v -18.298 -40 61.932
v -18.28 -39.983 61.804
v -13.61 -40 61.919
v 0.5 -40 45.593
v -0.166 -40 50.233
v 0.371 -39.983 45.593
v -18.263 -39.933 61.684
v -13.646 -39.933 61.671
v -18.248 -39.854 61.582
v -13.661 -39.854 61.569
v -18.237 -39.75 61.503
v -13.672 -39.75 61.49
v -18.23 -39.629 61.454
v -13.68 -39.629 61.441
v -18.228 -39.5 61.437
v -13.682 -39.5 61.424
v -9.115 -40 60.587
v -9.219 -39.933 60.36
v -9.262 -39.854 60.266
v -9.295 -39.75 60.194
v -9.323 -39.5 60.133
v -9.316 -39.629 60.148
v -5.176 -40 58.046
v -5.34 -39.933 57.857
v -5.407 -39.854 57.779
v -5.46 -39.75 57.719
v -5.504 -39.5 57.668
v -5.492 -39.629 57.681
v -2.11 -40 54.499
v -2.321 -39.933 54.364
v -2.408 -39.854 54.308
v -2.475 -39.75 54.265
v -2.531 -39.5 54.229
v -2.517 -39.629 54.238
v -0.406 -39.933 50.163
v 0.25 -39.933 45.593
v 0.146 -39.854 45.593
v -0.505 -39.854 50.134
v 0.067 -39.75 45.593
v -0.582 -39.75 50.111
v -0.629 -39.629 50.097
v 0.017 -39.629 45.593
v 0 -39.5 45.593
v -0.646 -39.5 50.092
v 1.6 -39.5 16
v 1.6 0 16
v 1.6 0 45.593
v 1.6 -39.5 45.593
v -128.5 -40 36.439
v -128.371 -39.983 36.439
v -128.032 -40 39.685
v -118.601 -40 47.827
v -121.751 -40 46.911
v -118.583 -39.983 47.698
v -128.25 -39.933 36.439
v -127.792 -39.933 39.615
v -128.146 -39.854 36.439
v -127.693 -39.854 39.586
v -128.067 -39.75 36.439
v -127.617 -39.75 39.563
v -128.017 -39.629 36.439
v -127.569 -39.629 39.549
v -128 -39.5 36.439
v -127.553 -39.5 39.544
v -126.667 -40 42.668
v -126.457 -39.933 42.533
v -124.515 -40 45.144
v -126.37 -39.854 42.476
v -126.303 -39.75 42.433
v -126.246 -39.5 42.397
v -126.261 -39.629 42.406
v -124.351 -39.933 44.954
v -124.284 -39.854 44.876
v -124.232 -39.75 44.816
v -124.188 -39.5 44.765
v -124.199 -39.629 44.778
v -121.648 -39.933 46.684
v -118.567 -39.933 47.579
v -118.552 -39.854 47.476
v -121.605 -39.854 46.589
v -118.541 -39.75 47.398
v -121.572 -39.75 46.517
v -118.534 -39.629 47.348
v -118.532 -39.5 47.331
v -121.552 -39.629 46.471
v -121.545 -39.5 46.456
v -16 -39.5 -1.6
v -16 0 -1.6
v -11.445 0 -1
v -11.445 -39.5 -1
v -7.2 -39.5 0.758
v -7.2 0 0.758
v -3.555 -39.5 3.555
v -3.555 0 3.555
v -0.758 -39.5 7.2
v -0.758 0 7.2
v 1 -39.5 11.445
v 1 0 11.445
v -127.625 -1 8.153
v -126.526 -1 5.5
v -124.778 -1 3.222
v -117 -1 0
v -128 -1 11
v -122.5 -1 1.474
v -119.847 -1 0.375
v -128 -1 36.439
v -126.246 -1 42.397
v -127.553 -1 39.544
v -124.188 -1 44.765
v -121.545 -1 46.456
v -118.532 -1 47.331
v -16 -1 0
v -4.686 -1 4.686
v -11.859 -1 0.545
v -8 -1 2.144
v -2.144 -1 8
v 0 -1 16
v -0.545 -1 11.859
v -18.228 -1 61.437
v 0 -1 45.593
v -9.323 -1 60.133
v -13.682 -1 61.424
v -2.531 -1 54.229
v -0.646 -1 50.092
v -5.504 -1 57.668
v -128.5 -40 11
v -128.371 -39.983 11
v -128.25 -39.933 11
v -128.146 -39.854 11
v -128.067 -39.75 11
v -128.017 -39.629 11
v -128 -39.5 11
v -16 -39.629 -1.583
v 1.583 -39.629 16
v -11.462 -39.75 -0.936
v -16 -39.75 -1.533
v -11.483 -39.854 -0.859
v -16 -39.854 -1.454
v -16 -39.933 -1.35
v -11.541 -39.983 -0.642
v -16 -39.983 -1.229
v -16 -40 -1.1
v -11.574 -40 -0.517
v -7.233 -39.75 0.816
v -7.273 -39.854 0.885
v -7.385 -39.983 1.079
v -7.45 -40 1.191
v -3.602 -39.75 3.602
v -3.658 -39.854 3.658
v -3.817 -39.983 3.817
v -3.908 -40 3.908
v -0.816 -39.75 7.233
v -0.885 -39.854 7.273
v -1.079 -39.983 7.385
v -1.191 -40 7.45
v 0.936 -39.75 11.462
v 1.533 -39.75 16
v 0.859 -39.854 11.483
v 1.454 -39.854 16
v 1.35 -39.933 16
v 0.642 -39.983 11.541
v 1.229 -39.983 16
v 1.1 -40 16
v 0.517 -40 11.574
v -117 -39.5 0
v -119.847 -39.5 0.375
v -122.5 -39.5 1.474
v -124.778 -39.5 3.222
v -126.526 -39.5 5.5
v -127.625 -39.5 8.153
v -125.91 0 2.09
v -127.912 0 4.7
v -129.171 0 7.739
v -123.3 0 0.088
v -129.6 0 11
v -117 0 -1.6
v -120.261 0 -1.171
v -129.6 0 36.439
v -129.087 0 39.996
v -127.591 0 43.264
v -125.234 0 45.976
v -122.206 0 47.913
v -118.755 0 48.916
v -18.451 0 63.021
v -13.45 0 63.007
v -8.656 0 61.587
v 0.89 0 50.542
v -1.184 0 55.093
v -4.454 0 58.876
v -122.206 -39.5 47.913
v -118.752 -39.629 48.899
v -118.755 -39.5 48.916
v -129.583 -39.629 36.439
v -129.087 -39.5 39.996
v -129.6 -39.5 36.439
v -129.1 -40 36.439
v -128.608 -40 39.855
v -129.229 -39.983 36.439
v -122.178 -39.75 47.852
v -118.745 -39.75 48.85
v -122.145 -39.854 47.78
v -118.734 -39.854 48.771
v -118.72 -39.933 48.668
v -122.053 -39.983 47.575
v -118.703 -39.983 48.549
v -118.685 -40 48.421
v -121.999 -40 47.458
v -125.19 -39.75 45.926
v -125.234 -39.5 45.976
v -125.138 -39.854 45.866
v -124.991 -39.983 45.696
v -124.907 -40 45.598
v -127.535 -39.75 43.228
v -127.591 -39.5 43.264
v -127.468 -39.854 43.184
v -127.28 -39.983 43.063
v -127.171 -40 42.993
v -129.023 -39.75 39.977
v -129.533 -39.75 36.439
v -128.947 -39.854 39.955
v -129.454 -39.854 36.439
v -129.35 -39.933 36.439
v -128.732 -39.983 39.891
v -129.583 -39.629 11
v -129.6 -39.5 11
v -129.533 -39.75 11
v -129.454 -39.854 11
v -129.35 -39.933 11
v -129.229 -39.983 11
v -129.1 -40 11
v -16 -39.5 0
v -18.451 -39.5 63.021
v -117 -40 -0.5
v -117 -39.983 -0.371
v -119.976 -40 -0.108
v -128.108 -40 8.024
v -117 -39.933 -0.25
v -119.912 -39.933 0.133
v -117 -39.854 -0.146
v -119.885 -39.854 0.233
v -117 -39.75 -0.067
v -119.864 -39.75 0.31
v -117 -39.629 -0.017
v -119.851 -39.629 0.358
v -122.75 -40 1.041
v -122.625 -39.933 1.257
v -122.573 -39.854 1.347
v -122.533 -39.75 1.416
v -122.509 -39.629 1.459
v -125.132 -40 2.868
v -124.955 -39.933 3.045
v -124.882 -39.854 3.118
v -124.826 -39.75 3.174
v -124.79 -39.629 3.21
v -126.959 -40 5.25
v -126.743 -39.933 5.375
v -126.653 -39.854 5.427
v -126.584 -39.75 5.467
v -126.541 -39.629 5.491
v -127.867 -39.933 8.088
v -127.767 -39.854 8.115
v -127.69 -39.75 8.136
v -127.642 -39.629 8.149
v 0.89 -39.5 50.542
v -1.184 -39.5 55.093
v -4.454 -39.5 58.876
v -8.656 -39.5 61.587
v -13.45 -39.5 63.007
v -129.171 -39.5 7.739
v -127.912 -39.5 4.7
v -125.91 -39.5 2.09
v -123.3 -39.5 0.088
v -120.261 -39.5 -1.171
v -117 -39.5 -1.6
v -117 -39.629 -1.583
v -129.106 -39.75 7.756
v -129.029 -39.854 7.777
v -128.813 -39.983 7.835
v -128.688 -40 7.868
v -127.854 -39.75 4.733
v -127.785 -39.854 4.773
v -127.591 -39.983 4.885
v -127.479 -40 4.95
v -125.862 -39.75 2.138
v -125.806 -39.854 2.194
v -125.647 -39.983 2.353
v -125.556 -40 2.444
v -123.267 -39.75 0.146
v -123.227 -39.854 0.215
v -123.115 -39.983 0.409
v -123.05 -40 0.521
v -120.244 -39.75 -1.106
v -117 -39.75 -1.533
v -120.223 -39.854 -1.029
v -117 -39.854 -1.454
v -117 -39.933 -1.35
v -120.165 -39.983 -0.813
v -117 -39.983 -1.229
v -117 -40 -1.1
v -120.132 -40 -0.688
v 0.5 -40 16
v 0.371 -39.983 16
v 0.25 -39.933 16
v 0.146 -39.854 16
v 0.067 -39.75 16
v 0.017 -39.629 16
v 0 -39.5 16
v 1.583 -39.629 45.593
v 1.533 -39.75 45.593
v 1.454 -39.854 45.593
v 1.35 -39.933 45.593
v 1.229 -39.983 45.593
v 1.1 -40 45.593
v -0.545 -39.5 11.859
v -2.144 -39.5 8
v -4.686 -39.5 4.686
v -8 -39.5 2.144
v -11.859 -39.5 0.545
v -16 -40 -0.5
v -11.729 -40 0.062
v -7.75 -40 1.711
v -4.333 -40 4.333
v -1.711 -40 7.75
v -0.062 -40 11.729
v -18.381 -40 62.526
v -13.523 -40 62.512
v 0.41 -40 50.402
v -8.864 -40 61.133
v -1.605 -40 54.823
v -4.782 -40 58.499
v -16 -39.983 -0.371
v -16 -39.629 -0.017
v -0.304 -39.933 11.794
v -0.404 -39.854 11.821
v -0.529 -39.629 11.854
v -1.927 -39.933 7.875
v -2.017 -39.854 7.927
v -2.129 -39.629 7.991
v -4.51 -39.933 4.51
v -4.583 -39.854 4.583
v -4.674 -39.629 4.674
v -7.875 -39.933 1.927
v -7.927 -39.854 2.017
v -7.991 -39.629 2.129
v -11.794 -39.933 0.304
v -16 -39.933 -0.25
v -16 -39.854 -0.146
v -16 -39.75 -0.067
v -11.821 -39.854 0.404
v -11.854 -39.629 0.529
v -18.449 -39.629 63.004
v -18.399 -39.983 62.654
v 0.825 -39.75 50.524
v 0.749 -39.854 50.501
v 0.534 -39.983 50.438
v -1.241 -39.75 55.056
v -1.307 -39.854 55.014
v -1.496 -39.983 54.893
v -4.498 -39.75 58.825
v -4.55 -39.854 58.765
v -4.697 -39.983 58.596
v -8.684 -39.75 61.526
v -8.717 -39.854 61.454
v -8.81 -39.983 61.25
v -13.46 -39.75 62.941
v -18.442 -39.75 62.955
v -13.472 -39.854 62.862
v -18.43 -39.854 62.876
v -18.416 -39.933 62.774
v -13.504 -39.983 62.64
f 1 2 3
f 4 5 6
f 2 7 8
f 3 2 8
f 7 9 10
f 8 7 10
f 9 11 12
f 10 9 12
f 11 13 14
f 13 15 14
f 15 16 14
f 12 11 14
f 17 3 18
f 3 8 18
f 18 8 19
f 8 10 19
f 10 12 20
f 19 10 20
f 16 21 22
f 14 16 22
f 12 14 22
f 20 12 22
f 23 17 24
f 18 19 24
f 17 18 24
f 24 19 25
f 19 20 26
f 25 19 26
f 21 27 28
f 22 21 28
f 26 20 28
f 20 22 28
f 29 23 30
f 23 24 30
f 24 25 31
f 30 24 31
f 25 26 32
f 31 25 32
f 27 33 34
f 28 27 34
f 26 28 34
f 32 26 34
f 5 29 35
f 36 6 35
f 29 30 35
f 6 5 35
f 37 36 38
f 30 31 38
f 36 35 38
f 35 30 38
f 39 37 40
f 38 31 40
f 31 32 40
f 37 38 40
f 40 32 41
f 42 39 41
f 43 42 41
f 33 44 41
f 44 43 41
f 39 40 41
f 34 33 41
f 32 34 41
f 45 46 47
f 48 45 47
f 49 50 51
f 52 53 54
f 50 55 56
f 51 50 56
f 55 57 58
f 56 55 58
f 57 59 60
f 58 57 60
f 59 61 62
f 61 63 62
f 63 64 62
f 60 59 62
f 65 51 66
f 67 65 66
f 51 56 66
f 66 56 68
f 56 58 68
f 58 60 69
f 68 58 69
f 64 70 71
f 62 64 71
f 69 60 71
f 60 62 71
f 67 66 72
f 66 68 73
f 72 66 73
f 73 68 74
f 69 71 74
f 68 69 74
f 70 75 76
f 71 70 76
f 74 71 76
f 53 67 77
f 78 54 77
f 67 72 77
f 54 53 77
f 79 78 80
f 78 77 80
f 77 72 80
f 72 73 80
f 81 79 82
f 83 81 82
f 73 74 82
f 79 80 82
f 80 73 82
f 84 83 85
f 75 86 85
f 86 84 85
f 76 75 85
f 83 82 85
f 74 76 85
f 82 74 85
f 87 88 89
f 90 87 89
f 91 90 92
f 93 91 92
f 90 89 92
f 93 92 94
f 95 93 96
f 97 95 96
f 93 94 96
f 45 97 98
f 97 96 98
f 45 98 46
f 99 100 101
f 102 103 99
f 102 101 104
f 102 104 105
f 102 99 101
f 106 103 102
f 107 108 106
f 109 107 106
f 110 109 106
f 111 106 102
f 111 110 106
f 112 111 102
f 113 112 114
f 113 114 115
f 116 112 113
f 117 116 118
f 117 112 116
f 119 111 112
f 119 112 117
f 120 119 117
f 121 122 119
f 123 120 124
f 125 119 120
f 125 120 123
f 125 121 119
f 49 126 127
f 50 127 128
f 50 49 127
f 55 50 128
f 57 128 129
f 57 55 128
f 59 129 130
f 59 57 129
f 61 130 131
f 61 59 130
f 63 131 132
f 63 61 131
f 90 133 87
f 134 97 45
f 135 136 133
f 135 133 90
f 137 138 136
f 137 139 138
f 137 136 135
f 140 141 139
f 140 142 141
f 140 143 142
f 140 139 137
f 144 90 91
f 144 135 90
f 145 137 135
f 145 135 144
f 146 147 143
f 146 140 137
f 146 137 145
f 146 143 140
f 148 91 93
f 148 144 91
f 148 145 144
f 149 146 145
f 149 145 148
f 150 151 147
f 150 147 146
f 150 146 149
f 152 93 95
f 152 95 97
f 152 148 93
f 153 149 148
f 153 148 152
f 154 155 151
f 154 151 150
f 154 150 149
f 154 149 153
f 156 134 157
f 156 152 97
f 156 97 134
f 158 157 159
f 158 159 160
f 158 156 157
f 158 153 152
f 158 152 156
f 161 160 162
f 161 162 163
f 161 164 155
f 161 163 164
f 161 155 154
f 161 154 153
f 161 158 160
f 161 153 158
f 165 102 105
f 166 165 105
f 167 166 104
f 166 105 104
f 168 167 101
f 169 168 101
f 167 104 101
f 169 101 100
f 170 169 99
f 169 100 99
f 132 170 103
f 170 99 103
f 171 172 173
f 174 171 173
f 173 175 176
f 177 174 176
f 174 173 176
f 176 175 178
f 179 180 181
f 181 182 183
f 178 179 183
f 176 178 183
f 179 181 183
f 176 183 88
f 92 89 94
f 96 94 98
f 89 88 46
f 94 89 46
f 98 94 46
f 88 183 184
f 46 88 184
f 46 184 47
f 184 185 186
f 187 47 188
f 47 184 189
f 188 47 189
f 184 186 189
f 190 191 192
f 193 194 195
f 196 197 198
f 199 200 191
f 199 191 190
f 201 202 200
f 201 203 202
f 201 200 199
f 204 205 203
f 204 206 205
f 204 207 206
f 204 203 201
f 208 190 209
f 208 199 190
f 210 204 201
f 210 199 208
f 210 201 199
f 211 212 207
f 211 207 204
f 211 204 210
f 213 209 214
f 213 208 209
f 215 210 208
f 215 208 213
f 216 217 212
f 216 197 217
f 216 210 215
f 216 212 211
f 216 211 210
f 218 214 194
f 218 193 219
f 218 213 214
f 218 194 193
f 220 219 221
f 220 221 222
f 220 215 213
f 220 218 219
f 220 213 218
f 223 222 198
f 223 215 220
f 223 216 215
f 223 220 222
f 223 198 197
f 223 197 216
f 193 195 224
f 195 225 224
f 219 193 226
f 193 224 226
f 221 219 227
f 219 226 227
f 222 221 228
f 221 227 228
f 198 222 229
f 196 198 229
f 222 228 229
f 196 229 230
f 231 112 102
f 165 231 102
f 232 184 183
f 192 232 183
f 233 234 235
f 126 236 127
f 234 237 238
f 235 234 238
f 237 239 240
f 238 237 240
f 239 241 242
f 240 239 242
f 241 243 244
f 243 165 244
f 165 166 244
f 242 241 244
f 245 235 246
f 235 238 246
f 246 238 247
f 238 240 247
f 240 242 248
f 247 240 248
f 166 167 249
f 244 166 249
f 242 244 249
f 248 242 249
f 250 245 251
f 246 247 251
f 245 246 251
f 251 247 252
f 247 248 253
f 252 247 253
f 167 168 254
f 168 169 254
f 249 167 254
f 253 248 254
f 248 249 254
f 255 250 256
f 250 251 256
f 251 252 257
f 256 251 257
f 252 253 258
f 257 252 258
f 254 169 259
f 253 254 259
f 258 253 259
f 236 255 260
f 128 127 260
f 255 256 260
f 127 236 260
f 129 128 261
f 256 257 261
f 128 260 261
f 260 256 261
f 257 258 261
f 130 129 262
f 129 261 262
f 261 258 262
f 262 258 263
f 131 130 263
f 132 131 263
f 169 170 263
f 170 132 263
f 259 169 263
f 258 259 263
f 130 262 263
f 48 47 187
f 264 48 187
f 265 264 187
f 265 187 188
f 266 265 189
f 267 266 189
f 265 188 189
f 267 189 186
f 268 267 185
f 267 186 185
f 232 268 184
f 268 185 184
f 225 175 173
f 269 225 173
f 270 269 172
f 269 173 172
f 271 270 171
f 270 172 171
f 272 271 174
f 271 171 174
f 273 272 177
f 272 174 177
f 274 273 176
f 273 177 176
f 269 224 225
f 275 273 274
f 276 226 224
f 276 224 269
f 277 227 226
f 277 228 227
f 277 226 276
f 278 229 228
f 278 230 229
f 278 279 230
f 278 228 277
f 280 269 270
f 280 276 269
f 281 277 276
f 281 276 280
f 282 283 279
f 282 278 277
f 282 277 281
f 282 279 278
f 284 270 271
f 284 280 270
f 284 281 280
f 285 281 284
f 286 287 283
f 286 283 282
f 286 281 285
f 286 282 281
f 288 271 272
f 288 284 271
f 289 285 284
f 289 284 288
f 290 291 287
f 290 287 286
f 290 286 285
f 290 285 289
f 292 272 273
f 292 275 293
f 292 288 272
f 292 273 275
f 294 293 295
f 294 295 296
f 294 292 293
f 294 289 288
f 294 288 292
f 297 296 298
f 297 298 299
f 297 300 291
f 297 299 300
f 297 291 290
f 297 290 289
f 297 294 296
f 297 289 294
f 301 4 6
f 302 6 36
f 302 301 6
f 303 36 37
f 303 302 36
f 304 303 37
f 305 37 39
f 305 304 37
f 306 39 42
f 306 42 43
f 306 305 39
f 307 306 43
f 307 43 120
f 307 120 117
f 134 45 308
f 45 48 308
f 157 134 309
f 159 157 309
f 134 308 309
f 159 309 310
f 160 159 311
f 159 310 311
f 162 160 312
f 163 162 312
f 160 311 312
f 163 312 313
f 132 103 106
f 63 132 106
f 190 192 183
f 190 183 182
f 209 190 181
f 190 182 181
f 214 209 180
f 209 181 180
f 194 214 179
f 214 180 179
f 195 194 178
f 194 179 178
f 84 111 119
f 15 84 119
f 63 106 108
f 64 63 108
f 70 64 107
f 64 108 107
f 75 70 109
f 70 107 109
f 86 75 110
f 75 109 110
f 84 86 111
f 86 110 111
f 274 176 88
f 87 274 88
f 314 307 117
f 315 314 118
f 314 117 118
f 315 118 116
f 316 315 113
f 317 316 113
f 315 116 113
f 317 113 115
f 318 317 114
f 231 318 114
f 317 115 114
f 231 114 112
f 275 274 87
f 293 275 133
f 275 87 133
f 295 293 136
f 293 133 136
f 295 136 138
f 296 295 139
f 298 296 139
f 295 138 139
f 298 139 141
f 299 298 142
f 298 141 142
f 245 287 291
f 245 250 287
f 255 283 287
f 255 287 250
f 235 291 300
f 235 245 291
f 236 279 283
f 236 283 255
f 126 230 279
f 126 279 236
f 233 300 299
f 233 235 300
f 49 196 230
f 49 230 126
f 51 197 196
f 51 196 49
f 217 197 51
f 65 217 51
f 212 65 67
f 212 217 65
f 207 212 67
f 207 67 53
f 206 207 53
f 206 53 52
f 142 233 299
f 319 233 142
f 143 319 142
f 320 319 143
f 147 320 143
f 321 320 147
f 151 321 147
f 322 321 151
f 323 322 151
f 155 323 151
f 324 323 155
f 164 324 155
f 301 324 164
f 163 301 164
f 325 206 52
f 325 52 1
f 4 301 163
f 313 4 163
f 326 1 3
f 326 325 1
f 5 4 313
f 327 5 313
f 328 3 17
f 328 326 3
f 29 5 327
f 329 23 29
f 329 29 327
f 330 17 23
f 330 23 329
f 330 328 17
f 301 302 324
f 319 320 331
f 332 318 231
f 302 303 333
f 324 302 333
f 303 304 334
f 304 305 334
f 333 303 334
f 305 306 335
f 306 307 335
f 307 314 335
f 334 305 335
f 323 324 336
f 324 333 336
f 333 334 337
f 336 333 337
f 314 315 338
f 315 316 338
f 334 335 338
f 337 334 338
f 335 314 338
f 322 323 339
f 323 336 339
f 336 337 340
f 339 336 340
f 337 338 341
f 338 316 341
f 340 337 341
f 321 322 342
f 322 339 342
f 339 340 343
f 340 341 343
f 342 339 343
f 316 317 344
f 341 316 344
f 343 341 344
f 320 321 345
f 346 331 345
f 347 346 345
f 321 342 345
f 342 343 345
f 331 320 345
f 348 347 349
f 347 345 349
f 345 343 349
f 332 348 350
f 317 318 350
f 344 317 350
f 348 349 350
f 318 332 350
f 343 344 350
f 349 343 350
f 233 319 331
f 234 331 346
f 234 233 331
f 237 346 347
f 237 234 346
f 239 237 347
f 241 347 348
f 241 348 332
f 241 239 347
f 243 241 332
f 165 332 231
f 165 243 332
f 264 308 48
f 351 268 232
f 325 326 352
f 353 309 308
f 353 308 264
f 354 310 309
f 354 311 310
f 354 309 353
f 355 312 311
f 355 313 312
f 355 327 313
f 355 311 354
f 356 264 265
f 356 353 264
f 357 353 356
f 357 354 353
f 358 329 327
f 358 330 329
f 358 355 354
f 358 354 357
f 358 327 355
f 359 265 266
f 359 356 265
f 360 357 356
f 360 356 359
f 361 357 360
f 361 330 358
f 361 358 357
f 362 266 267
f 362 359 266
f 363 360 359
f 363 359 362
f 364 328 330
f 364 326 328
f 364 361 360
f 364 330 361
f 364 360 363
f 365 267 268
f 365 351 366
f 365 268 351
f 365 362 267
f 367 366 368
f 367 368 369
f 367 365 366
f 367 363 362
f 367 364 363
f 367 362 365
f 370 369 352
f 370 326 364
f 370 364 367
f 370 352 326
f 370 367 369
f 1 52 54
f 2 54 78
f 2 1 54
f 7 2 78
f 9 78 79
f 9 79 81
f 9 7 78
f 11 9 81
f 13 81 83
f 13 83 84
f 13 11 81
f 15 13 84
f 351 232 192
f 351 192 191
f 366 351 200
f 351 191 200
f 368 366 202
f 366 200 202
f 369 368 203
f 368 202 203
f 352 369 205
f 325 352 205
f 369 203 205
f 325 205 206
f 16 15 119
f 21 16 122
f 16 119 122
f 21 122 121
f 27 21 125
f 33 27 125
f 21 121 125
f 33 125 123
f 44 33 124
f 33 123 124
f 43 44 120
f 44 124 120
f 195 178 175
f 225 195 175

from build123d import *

# Parameters (mm, degrees)
F1_DEPTH = 1
F2_DEPTH = 40
F3_R     = 0.5


with BuildPart() as f1:
    # F0 (on Front) → F1 (new body)
    with BuildSketch(Plane.XZ):
        with BuildLine():
            ThreePointArc((-16, 0), (-4.686292, 4.686292), (0, 16))
            Line((0, 16), (0, 45.592571))
            ThreePointArc((0, 45.592571), (-5.503554, 57.668358), (-18.228077, 61.436677))
            Line((-18.228077, 61.436677), (-118.531803, 47.331465))
            ThreePointArc((-118.531803, 47.331465), (-125.302103, 43.65495), (-128, 36.438643))
            Line((-128, 36.438643), (-128, 11))
            ThreePointArc((-128, 11), (-124.778175, 3.221825), (-117, 0))
            Line((-117, 0), (-16, 0))
        make_face()
    extrude(amount=F1_DEPTH)

    # F0 (on Front) → F2 (join)
    with BuildSketch(Plane.XZ):
        with BuildLine():
            ThreePointArc((-129.6, 11), (-125.909545, 2.090455), (-117, -1.6))
            Line((-117, -1.6), (-16, -1.6))
            ThreePointArc((-16, -1.6), (-3.554921, 3.554921), (1.6, 16))
            Line((1.6, 16), (1.6, 45.592571))
            ThreePointArc((1.6, 45.592571), (-4.453909, 58.875936), (-18.450885, 63.021087))
            Line((-18.450885, 63.021087), (-118.754611, 48.915876))
            ThreePointArc((-118.754611, 48.915876), (-126.509682, 44.704594), (-129.6, 36.438643))
            Line((-129.6, 36.438643), (-129.6, 11))
        make_face()
        with BuildLine():
            Line((0, 45.592571), (0, 16))
            ThreePointArc((0, 16), (-4.686292, 4.686292), (-16, 0))
            Line((-16, 0), (-117, 0))
            ThreePointArc((-117, 0), (-124.778175, 3.221825), (-128, 11))
            Line((-128, 11), (-128, 36.438643))
            ThreePointArc((-128, 36.438643), (-125.302103, 43.65495), (-118.531803, 47.331465))
            Line((-118.531803, 47.331465), (-18.228077, 61.436677))
            ThreePointArc((-18.228077, 61.436677), (-5.503554, 57.668358), (0, 45.592571))
        make_face(mode=Mode.SUBTRACT)
    extrude(amount=F2_DEPTH)

    # F3
    f3_edges = [f1.edges().sort_by_distance(p)[0] for p in [
        (-66.5, -40, -1.6),
        (-66.5, -40, 0),
    ]]
    fillet(f3_edges, radius=F3_R)


solid = f1.part
